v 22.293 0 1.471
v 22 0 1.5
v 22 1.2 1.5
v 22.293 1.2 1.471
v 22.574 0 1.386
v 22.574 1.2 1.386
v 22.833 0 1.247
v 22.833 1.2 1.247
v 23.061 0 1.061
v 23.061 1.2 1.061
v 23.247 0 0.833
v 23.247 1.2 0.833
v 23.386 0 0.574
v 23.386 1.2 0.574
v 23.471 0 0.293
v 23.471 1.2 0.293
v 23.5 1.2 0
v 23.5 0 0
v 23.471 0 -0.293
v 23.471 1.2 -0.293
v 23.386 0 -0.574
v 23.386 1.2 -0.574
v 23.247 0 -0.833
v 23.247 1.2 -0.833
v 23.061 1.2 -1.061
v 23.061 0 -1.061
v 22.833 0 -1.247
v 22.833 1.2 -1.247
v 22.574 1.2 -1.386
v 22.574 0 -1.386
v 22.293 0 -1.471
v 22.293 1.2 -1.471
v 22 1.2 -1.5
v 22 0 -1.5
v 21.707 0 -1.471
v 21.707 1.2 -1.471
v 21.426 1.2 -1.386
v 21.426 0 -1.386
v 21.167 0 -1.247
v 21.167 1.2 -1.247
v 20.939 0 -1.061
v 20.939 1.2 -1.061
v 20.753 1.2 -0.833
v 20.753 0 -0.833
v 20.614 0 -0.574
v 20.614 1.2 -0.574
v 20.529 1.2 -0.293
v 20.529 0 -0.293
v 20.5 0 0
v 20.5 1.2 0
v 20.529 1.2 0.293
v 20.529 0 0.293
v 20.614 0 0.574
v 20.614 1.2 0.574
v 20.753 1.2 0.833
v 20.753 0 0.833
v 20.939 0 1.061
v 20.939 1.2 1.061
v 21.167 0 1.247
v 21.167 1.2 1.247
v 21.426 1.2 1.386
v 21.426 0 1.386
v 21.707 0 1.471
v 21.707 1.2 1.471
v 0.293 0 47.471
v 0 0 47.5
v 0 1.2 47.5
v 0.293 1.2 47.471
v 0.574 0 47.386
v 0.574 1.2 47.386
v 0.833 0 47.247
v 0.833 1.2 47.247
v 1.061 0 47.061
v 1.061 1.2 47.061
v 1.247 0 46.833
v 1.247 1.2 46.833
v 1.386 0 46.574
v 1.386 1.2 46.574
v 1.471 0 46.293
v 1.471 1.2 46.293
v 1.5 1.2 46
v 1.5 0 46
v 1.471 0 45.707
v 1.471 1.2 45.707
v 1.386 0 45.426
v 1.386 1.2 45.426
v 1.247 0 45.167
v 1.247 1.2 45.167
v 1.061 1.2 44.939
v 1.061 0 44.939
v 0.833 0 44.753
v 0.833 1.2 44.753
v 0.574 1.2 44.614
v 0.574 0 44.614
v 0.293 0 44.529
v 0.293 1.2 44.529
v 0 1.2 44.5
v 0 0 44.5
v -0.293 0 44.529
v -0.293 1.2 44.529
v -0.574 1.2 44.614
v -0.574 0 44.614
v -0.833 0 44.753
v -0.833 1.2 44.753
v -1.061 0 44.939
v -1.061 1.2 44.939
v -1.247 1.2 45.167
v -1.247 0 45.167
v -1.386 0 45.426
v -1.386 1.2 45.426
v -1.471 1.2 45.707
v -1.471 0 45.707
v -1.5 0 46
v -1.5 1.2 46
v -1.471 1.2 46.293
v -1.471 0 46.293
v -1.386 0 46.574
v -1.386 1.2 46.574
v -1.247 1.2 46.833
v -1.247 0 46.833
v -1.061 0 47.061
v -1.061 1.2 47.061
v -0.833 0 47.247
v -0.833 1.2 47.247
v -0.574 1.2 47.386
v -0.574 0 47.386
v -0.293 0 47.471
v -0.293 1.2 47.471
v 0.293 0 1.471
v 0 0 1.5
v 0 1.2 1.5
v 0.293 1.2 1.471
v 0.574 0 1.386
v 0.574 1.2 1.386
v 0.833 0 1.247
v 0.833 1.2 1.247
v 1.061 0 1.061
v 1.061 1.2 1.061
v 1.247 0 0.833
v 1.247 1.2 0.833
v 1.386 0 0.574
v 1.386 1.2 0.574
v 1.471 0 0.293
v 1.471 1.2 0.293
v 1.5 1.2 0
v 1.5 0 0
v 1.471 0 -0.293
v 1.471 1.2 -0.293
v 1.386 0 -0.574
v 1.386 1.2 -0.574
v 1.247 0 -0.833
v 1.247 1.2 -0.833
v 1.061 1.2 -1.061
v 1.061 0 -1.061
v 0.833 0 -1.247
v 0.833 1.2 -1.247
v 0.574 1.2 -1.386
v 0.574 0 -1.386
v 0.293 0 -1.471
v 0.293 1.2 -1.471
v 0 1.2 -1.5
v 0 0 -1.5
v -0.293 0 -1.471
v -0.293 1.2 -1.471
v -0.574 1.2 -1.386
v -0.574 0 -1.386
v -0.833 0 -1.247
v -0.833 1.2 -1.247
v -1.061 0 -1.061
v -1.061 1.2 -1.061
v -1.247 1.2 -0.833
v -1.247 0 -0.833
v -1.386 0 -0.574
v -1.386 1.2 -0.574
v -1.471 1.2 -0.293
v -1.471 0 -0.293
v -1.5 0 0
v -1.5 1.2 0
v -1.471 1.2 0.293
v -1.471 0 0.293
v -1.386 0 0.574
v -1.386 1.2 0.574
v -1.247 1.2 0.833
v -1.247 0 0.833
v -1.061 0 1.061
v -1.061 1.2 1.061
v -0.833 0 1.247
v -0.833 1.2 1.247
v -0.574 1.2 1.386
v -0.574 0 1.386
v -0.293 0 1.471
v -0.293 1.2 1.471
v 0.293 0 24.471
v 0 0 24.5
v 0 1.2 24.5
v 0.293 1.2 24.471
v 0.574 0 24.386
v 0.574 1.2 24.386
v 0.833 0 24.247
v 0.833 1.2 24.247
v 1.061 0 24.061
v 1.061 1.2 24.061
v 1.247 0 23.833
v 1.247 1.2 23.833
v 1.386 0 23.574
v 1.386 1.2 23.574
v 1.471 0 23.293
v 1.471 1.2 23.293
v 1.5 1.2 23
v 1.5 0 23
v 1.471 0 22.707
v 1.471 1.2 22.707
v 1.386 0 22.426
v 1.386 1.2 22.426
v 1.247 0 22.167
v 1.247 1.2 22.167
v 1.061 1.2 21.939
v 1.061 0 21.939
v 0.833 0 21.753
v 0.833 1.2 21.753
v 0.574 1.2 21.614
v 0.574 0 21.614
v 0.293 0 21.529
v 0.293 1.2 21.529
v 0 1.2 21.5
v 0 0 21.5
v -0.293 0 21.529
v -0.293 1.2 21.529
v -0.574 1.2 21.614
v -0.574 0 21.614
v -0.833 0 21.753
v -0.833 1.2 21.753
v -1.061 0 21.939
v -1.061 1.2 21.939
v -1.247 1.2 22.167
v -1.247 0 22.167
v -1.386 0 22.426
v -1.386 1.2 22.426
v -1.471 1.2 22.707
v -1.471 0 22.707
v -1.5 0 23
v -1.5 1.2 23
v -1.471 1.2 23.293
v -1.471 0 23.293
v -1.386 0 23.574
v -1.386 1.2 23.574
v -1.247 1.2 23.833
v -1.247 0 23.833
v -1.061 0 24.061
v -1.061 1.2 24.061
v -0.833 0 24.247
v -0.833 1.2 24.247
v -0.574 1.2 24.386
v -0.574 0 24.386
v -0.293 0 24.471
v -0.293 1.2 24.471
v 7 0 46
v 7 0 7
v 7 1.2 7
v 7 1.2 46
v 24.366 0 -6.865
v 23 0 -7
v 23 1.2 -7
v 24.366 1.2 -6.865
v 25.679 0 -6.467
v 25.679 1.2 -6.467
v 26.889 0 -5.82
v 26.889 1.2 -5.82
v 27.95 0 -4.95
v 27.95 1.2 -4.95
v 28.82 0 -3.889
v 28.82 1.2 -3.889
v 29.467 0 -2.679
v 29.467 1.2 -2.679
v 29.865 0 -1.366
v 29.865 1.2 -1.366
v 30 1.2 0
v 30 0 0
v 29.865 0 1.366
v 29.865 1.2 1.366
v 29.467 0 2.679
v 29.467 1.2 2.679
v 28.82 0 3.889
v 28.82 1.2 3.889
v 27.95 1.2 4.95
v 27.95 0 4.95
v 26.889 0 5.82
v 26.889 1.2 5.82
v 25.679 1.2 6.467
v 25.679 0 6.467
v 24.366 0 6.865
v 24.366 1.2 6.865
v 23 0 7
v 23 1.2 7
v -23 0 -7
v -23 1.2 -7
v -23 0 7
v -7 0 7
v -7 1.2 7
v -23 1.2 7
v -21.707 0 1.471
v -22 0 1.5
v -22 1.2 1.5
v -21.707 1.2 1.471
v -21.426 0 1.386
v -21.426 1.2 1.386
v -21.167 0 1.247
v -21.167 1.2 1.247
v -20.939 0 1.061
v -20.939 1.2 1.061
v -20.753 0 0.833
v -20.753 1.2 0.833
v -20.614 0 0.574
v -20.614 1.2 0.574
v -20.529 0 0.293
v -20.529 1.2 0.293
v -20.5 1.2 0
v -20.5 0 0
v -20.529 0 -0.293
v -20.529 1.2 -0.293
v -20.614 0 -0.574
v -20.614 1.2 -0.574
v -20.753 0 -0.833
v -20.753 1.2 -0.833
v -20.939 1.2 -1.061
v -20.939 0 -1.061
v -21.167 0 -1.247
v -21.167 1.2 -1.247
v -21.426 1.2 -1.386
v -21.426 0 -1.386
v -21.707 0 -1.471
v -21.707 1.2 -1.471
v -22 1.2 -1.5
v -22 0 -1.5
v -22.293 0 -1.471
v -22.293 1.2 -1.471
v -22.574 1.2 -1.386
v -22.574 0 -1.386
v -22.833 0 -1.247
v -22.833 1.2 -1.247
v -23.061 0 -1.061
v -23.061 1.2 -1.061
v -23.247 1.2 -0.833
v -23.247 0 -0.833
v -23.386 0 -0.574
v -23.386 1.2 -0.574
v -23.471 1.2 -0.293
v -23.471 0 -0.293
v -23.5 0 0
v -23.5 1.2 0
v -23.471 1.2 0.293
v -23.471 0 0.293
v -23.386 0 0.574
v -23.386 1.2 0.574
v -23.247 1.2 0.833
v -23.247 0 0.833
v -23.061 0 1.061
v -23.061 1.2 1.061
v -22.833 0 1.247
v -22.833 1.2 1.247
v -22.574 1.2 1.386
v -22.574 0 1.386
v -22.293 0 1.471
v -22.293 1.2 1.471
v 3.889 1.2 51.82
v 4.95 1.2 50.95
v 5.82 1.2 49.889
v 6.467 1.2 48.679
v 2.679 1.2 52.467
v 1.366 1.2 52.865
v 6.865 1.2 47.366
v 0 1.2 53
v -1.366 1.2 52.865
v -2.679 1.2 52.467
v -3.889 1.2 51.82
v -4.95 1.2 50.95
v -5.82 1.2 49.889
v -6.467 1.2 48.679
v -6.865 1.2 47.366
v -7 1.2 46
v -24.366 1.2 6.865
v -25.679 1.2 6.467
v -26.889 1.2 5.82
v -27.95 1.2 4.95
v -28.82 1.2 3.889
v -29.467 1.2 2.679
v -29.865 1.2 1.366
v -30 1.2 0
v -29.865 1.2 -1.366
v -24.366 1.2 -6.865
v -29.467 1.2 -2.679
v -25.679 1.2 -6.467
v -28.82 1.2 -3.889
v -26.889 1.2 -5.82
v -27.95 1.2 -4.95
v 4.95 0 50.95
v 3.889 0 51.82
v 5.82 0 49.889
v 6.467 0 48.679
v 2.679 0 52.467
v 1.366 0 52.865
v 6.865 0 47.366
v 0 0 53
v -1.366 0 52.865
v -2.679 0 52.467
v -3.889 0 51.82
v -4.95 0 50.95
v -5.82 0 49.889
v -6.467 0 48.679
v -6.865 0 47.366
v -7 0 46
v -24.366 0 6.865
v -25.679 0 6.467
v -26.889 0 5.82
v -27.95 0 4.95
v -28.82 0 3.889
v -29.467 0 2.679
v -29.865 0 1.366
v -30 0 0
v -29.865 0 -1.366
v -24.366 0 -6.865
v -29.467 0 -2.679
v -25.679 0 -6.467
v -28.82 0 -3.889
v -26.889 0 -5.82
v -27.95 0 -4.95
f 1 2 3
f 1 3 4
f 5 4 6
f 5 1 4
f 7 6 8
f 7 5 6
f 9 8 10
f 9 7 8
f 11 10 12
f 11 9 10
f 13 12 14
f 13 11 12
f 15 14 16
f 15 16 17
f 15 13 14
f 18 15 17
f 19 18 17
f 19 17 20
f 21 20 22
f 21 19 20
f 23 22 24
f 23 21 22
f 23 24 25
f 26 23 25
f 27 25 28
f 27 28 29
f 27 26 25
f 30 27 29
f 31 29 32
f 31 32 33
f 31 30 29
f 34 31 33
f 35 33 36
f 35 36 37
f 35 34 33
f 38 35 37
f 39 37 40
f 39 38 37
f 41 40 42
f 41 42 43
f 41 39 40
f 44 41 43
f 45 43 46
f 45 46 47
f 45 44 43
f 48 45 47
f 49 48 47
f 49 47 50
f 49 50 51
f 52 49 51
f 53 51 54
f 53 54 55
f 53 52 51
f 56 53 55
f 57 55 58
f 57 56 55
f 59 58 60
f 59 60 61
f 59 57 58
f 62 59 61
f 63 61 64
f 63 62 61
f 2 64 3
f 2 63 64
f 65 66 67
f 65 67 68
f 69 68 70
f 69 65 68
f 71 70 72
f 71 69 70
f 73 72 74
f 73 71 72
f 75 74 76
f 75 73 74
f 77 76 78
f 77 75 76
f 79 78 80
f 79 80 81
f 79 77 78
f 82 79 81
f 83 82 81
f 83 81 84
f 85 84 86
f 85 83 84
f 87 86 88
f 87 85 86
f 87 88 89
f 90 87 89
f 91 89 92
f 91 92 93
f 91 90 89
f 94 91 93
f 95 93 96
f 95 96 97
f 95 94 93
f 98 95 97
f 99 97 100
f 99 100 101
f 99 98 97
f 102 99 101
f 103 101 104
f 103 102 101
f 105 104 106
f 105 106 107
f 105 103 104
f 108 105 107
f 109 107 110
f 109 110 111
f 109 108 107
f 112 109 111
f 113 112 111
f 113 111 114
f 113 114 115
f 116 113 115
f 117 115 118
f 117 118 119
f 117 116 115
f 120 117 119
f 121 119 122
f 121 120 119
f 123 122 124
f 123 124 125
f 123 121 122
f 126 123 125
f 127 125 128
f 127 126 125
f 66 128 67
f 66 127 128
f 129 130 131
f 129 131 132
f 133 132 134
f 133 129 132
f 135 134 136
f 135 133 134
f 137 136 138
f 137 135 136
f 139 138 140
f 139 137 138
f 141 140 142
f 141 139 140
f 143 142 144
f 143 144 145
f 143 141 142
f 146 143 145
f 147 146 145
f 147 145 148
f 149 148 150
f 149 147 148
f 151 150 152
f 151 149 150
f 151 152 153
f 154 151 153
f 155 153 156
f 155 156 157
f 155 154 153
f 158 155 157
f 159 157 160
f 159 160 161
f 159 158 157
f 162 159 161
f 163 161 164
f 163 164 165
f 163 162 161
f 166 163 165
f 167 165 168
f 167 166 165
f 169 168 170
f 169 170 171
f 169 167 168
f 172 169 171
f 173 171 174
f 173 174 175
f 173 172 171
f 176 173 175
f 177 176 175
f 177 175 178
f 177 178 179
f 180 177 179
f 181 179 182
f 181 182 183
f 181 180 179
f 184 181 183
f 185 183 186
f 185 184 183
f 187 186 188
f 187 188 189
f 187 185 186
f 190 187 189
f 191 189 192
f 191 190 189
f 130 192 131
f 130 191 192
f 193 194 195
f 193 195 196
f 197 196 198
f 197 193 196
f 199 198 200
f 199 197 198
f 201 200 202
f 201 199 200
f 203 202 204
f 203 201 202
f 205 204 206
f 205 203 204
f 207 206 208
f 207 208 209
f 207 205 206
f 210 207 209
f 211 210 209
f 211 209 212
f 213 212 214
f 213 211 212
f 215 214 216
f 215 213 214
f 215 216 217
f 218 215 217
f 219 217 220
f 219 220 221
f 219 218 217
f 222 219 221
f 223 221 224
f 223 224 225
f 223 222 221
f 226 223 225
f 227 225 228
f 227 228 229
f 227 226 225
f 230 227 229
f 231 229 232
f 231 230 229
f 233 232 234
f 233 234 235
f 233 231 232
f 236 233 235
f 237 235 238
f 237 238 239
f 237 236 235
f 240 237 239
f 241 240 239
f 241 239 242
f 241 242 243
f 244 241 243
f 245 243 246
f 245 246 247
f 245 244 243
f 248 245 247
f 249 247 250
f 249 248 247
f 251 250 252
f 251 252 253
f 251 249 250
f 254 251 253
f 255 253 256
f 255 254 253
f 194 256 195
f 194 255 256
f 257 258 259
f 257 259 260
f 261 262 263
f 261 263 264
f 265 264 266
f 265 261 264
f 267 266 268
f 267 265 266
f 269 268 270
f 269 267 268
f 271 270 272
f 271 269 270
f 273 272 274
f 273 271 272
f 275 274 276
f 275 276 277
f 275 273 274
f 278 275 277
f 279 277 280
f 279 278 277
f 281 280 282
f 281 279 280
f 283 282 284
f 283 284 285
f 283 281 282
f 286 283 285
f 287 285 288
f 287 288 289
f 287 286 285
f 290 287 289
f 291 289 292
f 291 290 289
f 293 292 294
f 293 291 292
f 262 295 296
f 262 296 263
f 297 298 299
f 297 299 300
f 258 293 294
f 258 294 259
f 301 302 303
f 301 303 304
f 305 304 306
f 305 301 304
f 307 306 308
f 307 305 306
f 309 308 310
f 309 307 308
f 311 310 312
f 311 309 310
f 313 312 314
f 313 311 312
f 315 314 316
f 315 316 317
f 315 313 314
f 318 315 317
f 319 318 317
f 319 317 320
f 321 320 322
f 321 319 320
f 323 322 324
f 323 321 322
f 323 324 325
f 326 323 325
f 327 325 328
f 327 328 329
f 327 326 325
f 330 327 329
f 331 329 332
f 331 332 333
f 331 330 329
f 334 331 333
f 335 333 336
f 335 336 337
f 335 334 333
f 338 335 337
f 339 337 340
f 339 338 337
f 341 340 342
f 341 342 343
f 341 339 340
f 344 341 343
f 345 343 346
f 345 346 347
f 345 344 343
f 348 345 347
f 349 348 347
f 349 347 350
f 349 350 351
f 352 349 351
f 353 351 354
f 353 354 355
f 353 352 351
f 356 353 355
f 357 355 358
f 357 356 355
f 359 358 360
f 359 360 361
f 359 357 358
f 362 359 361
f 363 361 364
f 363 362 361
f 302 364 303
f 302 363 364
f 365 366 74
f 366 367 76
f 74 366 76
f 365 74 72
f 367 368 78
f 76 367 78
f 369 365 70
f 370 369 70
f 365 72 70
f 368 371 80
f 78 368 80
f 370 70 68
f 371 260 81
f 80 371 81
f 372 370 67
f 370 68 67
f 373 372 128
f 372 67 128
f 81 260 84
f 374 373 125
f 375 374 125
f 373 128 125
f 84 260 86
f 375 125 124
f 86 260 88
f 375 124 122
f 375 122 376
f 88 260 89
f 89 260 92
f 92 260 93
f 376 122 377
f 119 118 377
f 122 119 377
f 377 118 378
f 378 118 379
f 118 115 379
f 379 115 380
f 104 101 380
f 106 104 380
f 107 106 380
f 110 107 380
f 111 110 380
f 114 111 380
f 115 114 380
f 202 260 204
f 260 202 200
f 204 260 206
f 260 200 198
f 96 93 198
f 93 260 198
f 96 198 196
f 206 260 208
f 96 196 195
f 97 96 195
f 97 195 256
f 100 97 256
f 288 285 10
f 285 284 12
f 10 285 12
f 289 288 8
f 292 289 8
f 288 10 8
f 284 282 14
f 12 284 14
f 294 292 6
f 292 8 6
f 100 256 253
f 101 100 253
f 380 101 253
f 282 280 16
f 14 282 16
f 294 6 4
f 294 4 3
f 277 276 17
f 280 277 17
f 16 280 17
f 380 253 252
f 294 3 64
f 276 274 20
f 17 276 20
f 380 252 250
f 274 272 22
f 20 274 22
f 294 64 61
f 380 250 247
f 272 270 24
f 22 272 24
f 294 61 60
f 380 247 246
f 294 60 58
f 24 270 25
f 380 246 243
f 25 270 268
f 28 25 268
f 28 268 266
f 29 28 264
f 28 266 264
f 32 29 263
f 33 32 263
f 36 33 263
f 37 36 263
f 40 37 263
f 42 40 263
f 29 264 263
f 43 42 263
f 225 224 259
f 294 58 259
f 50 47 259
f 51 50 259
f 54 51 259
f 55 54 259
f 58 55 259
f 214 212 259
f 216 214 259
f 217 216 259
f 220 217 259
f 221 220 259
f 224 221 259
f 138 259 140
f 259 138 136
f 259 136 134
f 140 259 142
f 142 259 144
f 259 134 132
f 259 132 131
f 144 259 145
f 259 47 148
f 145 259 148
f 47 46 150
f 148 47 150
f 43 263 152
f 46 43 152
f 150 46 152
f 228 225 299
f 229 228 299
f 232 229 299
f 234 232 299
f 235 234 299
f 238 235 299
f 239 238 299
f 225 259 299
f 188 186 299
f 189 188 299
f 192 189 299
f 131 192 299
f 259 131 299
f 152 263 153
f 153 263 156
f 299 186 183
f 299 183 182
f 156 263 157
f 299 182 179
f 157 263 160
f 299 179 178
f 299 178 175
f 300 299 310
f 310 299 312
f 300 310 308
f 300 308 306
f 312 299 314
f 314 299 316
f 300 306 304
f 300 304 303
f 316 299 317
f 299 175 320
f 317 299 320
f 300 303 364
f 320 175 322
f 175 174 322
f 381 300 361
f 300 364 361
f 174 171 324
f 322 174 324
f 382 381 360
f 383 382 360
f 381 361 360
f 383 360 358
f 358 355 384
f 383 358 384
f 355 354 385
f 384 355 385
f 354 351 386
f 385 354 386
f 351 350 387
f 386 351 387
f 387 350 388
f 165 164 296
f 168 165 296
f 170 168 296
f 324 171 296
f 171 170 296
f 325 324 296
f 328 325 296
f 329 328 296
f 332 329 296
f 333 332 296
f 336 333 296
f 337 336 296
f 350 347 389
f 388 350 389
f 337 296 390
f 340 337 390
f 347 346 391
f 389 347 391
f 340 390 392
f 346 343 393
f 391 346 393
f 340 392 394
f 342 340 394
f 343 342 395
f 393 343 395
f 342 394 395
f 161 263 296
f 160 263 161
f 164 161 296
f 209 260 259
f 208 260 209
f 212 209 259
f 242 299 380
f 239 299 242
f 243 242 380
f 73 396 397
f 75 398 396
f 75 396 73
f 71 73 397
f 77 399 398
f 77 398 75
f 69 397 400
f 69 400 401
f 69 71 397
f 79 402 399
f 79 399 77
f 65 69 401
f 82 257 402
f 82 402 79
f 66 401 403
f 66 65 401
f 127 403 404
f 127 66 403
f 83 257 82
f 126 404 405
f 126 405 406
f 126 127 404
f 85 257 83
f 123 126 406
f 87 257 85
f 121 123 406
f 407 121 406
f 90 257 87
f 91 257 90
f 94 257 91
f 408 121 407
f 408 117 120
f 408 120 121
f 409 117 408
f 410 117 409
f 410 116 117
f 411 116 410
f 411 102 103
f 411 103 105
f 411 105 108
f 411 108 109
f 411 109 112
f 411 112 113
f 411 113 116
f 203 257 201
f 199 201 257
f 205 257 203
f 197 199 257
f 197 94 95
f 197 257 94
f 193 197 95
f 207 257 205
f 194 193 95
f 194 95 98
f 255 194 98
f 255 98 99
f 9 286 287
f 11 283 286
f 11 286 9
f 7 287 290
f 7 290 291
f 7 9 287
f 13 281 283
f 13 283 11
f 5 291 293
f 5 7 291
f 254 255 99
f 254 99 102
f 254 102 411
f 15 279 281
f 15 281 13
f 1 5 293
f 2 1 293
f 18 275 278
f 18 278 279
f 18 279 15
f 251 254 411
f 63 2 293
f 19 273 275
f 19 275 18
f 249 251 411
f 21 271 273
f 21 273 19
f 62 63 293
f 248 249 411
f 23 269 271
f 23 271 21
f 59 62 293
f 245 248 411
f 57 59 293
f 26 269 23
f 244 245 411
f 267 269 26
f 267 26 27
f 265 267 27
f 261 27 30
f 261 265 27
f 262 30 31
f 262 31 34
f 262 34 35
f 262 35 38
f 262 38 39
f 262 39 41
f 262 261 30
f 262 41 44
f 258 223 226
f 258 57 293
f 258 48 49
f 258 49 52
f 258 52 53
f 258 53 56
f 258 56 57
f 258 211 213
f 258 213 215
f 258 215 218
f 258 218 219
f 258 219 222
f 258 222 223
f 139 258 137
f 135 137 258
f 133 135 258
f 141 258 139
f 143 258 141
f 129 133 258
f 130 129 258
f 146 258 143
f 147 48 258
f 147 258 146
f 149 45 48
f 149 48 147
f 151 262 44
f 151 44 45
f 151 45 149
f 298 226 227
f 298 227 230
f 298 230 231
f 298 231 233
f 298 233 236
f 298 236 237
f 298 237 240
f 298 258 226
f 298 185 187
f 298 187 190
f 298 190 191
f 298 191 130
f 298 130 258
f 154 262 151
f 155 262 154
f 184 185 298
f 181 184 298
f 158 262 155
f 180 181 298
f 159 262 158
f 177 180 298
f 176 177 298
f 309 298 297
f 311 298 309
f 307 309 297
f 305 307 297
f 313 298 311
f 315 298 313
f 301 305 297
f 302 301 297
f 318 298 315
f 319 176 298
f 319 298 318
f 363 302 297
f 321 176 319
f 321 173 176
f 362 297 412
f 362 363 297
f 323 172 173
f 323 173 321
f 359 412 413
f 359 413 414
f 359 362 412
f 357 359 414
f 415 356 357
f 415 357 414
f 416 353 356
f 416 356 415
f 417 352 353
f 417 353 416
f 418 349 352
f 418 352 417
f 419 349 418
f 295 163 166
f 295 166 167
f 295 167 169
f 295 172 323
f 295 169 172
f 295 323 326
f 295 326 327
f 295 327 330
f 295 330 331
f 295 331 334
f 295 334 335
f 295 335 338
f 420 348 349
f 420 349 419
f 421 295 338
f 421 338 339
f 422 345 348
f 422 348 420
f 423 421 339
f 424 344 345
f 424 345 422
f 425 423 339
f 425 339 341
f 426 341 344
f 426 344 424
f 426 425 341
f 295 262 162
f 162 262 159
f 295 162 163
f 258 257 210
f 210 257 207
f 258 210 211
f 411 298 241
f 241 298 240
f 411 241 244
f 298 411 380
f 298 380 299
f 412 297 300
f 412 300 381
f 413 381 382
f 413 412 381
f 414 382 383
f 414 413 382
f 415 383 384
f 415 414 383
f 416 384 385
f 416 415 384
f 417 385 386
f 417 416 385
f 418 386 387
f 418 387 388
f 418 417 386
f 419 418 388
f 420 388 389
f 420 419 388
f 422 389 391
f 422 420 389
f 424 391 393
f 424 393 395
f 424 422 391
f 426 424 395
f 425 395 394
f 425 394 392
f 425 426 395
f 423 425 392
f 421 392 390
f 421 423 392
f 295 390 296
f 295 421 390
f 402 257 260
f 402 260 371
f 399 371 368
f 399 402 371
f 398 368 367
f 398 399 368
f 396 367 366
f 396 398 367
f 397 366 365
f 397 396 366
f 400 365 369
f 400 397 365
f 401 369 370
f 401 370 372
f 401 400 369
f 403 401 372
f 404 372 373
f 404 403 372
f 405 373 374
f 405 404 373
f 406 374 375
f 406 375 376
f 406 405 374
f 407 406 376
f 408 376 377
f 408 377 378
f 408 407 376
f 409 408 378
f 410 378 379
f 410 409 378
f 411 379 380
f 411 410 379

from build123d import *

# Parameters (mm, degrees)
SKETCH_1_R      = 1.5
EXTRUDE_1_DEPTH = 1.2


with BuildPart() as part:
    # 草图1 → 凸台-拉伸1 (new body)
    with BuildSketch(Plane(origin=(0, 0, 0), x_dir=(1, 0, 0), z_dir=(0, 1, 0))):
        with BuildLine():
            Line((-23, 7), (23, 7))
            ThreePointArc((23, 7), (30, 0), (23, -7))
            Line((23, -7), (7, -7))
            Line((7, -7), (7, -46))
            ThreePointArc((7, -46), (0, -53), (-7, -46))
            Line((-7, -46), (-7, -7))
            Line((-7, -7), (-23, -7))
            ThreePointArc((-23, -7), (-30, 0), (-23, 7))
        make_face()
        with Locations(Location((22, 0, 0), (0, 0, 270))):
            Circle(SKETCH_1_R, mode=Mode.SUBTRACT)
        with Locations(Location((-22, 0, 0), (0, 0, 270))):
            Circle(SKETCH_1_R, mode=Mode.SUBTRACT)
        with Locations(Location((0, 0, 0), (0, 0, 270))):
            Circle(SKETCH_1_R, mode=Mode.SUBTRACT)
        with Locations(Location((0, -23, 0), (0, 0, 270))):
            Circle(SKETCH_1_R, mode=Mode.SUBTRACT)
        with Locations(Location((0, -46, 0), (0, 0, 270))):
            Circle(SKETCH_1_R, mode=Mode.SUBTRACT)
    extrude(amount=EXTRUDE_1_DEPTH)


solid = part.part
